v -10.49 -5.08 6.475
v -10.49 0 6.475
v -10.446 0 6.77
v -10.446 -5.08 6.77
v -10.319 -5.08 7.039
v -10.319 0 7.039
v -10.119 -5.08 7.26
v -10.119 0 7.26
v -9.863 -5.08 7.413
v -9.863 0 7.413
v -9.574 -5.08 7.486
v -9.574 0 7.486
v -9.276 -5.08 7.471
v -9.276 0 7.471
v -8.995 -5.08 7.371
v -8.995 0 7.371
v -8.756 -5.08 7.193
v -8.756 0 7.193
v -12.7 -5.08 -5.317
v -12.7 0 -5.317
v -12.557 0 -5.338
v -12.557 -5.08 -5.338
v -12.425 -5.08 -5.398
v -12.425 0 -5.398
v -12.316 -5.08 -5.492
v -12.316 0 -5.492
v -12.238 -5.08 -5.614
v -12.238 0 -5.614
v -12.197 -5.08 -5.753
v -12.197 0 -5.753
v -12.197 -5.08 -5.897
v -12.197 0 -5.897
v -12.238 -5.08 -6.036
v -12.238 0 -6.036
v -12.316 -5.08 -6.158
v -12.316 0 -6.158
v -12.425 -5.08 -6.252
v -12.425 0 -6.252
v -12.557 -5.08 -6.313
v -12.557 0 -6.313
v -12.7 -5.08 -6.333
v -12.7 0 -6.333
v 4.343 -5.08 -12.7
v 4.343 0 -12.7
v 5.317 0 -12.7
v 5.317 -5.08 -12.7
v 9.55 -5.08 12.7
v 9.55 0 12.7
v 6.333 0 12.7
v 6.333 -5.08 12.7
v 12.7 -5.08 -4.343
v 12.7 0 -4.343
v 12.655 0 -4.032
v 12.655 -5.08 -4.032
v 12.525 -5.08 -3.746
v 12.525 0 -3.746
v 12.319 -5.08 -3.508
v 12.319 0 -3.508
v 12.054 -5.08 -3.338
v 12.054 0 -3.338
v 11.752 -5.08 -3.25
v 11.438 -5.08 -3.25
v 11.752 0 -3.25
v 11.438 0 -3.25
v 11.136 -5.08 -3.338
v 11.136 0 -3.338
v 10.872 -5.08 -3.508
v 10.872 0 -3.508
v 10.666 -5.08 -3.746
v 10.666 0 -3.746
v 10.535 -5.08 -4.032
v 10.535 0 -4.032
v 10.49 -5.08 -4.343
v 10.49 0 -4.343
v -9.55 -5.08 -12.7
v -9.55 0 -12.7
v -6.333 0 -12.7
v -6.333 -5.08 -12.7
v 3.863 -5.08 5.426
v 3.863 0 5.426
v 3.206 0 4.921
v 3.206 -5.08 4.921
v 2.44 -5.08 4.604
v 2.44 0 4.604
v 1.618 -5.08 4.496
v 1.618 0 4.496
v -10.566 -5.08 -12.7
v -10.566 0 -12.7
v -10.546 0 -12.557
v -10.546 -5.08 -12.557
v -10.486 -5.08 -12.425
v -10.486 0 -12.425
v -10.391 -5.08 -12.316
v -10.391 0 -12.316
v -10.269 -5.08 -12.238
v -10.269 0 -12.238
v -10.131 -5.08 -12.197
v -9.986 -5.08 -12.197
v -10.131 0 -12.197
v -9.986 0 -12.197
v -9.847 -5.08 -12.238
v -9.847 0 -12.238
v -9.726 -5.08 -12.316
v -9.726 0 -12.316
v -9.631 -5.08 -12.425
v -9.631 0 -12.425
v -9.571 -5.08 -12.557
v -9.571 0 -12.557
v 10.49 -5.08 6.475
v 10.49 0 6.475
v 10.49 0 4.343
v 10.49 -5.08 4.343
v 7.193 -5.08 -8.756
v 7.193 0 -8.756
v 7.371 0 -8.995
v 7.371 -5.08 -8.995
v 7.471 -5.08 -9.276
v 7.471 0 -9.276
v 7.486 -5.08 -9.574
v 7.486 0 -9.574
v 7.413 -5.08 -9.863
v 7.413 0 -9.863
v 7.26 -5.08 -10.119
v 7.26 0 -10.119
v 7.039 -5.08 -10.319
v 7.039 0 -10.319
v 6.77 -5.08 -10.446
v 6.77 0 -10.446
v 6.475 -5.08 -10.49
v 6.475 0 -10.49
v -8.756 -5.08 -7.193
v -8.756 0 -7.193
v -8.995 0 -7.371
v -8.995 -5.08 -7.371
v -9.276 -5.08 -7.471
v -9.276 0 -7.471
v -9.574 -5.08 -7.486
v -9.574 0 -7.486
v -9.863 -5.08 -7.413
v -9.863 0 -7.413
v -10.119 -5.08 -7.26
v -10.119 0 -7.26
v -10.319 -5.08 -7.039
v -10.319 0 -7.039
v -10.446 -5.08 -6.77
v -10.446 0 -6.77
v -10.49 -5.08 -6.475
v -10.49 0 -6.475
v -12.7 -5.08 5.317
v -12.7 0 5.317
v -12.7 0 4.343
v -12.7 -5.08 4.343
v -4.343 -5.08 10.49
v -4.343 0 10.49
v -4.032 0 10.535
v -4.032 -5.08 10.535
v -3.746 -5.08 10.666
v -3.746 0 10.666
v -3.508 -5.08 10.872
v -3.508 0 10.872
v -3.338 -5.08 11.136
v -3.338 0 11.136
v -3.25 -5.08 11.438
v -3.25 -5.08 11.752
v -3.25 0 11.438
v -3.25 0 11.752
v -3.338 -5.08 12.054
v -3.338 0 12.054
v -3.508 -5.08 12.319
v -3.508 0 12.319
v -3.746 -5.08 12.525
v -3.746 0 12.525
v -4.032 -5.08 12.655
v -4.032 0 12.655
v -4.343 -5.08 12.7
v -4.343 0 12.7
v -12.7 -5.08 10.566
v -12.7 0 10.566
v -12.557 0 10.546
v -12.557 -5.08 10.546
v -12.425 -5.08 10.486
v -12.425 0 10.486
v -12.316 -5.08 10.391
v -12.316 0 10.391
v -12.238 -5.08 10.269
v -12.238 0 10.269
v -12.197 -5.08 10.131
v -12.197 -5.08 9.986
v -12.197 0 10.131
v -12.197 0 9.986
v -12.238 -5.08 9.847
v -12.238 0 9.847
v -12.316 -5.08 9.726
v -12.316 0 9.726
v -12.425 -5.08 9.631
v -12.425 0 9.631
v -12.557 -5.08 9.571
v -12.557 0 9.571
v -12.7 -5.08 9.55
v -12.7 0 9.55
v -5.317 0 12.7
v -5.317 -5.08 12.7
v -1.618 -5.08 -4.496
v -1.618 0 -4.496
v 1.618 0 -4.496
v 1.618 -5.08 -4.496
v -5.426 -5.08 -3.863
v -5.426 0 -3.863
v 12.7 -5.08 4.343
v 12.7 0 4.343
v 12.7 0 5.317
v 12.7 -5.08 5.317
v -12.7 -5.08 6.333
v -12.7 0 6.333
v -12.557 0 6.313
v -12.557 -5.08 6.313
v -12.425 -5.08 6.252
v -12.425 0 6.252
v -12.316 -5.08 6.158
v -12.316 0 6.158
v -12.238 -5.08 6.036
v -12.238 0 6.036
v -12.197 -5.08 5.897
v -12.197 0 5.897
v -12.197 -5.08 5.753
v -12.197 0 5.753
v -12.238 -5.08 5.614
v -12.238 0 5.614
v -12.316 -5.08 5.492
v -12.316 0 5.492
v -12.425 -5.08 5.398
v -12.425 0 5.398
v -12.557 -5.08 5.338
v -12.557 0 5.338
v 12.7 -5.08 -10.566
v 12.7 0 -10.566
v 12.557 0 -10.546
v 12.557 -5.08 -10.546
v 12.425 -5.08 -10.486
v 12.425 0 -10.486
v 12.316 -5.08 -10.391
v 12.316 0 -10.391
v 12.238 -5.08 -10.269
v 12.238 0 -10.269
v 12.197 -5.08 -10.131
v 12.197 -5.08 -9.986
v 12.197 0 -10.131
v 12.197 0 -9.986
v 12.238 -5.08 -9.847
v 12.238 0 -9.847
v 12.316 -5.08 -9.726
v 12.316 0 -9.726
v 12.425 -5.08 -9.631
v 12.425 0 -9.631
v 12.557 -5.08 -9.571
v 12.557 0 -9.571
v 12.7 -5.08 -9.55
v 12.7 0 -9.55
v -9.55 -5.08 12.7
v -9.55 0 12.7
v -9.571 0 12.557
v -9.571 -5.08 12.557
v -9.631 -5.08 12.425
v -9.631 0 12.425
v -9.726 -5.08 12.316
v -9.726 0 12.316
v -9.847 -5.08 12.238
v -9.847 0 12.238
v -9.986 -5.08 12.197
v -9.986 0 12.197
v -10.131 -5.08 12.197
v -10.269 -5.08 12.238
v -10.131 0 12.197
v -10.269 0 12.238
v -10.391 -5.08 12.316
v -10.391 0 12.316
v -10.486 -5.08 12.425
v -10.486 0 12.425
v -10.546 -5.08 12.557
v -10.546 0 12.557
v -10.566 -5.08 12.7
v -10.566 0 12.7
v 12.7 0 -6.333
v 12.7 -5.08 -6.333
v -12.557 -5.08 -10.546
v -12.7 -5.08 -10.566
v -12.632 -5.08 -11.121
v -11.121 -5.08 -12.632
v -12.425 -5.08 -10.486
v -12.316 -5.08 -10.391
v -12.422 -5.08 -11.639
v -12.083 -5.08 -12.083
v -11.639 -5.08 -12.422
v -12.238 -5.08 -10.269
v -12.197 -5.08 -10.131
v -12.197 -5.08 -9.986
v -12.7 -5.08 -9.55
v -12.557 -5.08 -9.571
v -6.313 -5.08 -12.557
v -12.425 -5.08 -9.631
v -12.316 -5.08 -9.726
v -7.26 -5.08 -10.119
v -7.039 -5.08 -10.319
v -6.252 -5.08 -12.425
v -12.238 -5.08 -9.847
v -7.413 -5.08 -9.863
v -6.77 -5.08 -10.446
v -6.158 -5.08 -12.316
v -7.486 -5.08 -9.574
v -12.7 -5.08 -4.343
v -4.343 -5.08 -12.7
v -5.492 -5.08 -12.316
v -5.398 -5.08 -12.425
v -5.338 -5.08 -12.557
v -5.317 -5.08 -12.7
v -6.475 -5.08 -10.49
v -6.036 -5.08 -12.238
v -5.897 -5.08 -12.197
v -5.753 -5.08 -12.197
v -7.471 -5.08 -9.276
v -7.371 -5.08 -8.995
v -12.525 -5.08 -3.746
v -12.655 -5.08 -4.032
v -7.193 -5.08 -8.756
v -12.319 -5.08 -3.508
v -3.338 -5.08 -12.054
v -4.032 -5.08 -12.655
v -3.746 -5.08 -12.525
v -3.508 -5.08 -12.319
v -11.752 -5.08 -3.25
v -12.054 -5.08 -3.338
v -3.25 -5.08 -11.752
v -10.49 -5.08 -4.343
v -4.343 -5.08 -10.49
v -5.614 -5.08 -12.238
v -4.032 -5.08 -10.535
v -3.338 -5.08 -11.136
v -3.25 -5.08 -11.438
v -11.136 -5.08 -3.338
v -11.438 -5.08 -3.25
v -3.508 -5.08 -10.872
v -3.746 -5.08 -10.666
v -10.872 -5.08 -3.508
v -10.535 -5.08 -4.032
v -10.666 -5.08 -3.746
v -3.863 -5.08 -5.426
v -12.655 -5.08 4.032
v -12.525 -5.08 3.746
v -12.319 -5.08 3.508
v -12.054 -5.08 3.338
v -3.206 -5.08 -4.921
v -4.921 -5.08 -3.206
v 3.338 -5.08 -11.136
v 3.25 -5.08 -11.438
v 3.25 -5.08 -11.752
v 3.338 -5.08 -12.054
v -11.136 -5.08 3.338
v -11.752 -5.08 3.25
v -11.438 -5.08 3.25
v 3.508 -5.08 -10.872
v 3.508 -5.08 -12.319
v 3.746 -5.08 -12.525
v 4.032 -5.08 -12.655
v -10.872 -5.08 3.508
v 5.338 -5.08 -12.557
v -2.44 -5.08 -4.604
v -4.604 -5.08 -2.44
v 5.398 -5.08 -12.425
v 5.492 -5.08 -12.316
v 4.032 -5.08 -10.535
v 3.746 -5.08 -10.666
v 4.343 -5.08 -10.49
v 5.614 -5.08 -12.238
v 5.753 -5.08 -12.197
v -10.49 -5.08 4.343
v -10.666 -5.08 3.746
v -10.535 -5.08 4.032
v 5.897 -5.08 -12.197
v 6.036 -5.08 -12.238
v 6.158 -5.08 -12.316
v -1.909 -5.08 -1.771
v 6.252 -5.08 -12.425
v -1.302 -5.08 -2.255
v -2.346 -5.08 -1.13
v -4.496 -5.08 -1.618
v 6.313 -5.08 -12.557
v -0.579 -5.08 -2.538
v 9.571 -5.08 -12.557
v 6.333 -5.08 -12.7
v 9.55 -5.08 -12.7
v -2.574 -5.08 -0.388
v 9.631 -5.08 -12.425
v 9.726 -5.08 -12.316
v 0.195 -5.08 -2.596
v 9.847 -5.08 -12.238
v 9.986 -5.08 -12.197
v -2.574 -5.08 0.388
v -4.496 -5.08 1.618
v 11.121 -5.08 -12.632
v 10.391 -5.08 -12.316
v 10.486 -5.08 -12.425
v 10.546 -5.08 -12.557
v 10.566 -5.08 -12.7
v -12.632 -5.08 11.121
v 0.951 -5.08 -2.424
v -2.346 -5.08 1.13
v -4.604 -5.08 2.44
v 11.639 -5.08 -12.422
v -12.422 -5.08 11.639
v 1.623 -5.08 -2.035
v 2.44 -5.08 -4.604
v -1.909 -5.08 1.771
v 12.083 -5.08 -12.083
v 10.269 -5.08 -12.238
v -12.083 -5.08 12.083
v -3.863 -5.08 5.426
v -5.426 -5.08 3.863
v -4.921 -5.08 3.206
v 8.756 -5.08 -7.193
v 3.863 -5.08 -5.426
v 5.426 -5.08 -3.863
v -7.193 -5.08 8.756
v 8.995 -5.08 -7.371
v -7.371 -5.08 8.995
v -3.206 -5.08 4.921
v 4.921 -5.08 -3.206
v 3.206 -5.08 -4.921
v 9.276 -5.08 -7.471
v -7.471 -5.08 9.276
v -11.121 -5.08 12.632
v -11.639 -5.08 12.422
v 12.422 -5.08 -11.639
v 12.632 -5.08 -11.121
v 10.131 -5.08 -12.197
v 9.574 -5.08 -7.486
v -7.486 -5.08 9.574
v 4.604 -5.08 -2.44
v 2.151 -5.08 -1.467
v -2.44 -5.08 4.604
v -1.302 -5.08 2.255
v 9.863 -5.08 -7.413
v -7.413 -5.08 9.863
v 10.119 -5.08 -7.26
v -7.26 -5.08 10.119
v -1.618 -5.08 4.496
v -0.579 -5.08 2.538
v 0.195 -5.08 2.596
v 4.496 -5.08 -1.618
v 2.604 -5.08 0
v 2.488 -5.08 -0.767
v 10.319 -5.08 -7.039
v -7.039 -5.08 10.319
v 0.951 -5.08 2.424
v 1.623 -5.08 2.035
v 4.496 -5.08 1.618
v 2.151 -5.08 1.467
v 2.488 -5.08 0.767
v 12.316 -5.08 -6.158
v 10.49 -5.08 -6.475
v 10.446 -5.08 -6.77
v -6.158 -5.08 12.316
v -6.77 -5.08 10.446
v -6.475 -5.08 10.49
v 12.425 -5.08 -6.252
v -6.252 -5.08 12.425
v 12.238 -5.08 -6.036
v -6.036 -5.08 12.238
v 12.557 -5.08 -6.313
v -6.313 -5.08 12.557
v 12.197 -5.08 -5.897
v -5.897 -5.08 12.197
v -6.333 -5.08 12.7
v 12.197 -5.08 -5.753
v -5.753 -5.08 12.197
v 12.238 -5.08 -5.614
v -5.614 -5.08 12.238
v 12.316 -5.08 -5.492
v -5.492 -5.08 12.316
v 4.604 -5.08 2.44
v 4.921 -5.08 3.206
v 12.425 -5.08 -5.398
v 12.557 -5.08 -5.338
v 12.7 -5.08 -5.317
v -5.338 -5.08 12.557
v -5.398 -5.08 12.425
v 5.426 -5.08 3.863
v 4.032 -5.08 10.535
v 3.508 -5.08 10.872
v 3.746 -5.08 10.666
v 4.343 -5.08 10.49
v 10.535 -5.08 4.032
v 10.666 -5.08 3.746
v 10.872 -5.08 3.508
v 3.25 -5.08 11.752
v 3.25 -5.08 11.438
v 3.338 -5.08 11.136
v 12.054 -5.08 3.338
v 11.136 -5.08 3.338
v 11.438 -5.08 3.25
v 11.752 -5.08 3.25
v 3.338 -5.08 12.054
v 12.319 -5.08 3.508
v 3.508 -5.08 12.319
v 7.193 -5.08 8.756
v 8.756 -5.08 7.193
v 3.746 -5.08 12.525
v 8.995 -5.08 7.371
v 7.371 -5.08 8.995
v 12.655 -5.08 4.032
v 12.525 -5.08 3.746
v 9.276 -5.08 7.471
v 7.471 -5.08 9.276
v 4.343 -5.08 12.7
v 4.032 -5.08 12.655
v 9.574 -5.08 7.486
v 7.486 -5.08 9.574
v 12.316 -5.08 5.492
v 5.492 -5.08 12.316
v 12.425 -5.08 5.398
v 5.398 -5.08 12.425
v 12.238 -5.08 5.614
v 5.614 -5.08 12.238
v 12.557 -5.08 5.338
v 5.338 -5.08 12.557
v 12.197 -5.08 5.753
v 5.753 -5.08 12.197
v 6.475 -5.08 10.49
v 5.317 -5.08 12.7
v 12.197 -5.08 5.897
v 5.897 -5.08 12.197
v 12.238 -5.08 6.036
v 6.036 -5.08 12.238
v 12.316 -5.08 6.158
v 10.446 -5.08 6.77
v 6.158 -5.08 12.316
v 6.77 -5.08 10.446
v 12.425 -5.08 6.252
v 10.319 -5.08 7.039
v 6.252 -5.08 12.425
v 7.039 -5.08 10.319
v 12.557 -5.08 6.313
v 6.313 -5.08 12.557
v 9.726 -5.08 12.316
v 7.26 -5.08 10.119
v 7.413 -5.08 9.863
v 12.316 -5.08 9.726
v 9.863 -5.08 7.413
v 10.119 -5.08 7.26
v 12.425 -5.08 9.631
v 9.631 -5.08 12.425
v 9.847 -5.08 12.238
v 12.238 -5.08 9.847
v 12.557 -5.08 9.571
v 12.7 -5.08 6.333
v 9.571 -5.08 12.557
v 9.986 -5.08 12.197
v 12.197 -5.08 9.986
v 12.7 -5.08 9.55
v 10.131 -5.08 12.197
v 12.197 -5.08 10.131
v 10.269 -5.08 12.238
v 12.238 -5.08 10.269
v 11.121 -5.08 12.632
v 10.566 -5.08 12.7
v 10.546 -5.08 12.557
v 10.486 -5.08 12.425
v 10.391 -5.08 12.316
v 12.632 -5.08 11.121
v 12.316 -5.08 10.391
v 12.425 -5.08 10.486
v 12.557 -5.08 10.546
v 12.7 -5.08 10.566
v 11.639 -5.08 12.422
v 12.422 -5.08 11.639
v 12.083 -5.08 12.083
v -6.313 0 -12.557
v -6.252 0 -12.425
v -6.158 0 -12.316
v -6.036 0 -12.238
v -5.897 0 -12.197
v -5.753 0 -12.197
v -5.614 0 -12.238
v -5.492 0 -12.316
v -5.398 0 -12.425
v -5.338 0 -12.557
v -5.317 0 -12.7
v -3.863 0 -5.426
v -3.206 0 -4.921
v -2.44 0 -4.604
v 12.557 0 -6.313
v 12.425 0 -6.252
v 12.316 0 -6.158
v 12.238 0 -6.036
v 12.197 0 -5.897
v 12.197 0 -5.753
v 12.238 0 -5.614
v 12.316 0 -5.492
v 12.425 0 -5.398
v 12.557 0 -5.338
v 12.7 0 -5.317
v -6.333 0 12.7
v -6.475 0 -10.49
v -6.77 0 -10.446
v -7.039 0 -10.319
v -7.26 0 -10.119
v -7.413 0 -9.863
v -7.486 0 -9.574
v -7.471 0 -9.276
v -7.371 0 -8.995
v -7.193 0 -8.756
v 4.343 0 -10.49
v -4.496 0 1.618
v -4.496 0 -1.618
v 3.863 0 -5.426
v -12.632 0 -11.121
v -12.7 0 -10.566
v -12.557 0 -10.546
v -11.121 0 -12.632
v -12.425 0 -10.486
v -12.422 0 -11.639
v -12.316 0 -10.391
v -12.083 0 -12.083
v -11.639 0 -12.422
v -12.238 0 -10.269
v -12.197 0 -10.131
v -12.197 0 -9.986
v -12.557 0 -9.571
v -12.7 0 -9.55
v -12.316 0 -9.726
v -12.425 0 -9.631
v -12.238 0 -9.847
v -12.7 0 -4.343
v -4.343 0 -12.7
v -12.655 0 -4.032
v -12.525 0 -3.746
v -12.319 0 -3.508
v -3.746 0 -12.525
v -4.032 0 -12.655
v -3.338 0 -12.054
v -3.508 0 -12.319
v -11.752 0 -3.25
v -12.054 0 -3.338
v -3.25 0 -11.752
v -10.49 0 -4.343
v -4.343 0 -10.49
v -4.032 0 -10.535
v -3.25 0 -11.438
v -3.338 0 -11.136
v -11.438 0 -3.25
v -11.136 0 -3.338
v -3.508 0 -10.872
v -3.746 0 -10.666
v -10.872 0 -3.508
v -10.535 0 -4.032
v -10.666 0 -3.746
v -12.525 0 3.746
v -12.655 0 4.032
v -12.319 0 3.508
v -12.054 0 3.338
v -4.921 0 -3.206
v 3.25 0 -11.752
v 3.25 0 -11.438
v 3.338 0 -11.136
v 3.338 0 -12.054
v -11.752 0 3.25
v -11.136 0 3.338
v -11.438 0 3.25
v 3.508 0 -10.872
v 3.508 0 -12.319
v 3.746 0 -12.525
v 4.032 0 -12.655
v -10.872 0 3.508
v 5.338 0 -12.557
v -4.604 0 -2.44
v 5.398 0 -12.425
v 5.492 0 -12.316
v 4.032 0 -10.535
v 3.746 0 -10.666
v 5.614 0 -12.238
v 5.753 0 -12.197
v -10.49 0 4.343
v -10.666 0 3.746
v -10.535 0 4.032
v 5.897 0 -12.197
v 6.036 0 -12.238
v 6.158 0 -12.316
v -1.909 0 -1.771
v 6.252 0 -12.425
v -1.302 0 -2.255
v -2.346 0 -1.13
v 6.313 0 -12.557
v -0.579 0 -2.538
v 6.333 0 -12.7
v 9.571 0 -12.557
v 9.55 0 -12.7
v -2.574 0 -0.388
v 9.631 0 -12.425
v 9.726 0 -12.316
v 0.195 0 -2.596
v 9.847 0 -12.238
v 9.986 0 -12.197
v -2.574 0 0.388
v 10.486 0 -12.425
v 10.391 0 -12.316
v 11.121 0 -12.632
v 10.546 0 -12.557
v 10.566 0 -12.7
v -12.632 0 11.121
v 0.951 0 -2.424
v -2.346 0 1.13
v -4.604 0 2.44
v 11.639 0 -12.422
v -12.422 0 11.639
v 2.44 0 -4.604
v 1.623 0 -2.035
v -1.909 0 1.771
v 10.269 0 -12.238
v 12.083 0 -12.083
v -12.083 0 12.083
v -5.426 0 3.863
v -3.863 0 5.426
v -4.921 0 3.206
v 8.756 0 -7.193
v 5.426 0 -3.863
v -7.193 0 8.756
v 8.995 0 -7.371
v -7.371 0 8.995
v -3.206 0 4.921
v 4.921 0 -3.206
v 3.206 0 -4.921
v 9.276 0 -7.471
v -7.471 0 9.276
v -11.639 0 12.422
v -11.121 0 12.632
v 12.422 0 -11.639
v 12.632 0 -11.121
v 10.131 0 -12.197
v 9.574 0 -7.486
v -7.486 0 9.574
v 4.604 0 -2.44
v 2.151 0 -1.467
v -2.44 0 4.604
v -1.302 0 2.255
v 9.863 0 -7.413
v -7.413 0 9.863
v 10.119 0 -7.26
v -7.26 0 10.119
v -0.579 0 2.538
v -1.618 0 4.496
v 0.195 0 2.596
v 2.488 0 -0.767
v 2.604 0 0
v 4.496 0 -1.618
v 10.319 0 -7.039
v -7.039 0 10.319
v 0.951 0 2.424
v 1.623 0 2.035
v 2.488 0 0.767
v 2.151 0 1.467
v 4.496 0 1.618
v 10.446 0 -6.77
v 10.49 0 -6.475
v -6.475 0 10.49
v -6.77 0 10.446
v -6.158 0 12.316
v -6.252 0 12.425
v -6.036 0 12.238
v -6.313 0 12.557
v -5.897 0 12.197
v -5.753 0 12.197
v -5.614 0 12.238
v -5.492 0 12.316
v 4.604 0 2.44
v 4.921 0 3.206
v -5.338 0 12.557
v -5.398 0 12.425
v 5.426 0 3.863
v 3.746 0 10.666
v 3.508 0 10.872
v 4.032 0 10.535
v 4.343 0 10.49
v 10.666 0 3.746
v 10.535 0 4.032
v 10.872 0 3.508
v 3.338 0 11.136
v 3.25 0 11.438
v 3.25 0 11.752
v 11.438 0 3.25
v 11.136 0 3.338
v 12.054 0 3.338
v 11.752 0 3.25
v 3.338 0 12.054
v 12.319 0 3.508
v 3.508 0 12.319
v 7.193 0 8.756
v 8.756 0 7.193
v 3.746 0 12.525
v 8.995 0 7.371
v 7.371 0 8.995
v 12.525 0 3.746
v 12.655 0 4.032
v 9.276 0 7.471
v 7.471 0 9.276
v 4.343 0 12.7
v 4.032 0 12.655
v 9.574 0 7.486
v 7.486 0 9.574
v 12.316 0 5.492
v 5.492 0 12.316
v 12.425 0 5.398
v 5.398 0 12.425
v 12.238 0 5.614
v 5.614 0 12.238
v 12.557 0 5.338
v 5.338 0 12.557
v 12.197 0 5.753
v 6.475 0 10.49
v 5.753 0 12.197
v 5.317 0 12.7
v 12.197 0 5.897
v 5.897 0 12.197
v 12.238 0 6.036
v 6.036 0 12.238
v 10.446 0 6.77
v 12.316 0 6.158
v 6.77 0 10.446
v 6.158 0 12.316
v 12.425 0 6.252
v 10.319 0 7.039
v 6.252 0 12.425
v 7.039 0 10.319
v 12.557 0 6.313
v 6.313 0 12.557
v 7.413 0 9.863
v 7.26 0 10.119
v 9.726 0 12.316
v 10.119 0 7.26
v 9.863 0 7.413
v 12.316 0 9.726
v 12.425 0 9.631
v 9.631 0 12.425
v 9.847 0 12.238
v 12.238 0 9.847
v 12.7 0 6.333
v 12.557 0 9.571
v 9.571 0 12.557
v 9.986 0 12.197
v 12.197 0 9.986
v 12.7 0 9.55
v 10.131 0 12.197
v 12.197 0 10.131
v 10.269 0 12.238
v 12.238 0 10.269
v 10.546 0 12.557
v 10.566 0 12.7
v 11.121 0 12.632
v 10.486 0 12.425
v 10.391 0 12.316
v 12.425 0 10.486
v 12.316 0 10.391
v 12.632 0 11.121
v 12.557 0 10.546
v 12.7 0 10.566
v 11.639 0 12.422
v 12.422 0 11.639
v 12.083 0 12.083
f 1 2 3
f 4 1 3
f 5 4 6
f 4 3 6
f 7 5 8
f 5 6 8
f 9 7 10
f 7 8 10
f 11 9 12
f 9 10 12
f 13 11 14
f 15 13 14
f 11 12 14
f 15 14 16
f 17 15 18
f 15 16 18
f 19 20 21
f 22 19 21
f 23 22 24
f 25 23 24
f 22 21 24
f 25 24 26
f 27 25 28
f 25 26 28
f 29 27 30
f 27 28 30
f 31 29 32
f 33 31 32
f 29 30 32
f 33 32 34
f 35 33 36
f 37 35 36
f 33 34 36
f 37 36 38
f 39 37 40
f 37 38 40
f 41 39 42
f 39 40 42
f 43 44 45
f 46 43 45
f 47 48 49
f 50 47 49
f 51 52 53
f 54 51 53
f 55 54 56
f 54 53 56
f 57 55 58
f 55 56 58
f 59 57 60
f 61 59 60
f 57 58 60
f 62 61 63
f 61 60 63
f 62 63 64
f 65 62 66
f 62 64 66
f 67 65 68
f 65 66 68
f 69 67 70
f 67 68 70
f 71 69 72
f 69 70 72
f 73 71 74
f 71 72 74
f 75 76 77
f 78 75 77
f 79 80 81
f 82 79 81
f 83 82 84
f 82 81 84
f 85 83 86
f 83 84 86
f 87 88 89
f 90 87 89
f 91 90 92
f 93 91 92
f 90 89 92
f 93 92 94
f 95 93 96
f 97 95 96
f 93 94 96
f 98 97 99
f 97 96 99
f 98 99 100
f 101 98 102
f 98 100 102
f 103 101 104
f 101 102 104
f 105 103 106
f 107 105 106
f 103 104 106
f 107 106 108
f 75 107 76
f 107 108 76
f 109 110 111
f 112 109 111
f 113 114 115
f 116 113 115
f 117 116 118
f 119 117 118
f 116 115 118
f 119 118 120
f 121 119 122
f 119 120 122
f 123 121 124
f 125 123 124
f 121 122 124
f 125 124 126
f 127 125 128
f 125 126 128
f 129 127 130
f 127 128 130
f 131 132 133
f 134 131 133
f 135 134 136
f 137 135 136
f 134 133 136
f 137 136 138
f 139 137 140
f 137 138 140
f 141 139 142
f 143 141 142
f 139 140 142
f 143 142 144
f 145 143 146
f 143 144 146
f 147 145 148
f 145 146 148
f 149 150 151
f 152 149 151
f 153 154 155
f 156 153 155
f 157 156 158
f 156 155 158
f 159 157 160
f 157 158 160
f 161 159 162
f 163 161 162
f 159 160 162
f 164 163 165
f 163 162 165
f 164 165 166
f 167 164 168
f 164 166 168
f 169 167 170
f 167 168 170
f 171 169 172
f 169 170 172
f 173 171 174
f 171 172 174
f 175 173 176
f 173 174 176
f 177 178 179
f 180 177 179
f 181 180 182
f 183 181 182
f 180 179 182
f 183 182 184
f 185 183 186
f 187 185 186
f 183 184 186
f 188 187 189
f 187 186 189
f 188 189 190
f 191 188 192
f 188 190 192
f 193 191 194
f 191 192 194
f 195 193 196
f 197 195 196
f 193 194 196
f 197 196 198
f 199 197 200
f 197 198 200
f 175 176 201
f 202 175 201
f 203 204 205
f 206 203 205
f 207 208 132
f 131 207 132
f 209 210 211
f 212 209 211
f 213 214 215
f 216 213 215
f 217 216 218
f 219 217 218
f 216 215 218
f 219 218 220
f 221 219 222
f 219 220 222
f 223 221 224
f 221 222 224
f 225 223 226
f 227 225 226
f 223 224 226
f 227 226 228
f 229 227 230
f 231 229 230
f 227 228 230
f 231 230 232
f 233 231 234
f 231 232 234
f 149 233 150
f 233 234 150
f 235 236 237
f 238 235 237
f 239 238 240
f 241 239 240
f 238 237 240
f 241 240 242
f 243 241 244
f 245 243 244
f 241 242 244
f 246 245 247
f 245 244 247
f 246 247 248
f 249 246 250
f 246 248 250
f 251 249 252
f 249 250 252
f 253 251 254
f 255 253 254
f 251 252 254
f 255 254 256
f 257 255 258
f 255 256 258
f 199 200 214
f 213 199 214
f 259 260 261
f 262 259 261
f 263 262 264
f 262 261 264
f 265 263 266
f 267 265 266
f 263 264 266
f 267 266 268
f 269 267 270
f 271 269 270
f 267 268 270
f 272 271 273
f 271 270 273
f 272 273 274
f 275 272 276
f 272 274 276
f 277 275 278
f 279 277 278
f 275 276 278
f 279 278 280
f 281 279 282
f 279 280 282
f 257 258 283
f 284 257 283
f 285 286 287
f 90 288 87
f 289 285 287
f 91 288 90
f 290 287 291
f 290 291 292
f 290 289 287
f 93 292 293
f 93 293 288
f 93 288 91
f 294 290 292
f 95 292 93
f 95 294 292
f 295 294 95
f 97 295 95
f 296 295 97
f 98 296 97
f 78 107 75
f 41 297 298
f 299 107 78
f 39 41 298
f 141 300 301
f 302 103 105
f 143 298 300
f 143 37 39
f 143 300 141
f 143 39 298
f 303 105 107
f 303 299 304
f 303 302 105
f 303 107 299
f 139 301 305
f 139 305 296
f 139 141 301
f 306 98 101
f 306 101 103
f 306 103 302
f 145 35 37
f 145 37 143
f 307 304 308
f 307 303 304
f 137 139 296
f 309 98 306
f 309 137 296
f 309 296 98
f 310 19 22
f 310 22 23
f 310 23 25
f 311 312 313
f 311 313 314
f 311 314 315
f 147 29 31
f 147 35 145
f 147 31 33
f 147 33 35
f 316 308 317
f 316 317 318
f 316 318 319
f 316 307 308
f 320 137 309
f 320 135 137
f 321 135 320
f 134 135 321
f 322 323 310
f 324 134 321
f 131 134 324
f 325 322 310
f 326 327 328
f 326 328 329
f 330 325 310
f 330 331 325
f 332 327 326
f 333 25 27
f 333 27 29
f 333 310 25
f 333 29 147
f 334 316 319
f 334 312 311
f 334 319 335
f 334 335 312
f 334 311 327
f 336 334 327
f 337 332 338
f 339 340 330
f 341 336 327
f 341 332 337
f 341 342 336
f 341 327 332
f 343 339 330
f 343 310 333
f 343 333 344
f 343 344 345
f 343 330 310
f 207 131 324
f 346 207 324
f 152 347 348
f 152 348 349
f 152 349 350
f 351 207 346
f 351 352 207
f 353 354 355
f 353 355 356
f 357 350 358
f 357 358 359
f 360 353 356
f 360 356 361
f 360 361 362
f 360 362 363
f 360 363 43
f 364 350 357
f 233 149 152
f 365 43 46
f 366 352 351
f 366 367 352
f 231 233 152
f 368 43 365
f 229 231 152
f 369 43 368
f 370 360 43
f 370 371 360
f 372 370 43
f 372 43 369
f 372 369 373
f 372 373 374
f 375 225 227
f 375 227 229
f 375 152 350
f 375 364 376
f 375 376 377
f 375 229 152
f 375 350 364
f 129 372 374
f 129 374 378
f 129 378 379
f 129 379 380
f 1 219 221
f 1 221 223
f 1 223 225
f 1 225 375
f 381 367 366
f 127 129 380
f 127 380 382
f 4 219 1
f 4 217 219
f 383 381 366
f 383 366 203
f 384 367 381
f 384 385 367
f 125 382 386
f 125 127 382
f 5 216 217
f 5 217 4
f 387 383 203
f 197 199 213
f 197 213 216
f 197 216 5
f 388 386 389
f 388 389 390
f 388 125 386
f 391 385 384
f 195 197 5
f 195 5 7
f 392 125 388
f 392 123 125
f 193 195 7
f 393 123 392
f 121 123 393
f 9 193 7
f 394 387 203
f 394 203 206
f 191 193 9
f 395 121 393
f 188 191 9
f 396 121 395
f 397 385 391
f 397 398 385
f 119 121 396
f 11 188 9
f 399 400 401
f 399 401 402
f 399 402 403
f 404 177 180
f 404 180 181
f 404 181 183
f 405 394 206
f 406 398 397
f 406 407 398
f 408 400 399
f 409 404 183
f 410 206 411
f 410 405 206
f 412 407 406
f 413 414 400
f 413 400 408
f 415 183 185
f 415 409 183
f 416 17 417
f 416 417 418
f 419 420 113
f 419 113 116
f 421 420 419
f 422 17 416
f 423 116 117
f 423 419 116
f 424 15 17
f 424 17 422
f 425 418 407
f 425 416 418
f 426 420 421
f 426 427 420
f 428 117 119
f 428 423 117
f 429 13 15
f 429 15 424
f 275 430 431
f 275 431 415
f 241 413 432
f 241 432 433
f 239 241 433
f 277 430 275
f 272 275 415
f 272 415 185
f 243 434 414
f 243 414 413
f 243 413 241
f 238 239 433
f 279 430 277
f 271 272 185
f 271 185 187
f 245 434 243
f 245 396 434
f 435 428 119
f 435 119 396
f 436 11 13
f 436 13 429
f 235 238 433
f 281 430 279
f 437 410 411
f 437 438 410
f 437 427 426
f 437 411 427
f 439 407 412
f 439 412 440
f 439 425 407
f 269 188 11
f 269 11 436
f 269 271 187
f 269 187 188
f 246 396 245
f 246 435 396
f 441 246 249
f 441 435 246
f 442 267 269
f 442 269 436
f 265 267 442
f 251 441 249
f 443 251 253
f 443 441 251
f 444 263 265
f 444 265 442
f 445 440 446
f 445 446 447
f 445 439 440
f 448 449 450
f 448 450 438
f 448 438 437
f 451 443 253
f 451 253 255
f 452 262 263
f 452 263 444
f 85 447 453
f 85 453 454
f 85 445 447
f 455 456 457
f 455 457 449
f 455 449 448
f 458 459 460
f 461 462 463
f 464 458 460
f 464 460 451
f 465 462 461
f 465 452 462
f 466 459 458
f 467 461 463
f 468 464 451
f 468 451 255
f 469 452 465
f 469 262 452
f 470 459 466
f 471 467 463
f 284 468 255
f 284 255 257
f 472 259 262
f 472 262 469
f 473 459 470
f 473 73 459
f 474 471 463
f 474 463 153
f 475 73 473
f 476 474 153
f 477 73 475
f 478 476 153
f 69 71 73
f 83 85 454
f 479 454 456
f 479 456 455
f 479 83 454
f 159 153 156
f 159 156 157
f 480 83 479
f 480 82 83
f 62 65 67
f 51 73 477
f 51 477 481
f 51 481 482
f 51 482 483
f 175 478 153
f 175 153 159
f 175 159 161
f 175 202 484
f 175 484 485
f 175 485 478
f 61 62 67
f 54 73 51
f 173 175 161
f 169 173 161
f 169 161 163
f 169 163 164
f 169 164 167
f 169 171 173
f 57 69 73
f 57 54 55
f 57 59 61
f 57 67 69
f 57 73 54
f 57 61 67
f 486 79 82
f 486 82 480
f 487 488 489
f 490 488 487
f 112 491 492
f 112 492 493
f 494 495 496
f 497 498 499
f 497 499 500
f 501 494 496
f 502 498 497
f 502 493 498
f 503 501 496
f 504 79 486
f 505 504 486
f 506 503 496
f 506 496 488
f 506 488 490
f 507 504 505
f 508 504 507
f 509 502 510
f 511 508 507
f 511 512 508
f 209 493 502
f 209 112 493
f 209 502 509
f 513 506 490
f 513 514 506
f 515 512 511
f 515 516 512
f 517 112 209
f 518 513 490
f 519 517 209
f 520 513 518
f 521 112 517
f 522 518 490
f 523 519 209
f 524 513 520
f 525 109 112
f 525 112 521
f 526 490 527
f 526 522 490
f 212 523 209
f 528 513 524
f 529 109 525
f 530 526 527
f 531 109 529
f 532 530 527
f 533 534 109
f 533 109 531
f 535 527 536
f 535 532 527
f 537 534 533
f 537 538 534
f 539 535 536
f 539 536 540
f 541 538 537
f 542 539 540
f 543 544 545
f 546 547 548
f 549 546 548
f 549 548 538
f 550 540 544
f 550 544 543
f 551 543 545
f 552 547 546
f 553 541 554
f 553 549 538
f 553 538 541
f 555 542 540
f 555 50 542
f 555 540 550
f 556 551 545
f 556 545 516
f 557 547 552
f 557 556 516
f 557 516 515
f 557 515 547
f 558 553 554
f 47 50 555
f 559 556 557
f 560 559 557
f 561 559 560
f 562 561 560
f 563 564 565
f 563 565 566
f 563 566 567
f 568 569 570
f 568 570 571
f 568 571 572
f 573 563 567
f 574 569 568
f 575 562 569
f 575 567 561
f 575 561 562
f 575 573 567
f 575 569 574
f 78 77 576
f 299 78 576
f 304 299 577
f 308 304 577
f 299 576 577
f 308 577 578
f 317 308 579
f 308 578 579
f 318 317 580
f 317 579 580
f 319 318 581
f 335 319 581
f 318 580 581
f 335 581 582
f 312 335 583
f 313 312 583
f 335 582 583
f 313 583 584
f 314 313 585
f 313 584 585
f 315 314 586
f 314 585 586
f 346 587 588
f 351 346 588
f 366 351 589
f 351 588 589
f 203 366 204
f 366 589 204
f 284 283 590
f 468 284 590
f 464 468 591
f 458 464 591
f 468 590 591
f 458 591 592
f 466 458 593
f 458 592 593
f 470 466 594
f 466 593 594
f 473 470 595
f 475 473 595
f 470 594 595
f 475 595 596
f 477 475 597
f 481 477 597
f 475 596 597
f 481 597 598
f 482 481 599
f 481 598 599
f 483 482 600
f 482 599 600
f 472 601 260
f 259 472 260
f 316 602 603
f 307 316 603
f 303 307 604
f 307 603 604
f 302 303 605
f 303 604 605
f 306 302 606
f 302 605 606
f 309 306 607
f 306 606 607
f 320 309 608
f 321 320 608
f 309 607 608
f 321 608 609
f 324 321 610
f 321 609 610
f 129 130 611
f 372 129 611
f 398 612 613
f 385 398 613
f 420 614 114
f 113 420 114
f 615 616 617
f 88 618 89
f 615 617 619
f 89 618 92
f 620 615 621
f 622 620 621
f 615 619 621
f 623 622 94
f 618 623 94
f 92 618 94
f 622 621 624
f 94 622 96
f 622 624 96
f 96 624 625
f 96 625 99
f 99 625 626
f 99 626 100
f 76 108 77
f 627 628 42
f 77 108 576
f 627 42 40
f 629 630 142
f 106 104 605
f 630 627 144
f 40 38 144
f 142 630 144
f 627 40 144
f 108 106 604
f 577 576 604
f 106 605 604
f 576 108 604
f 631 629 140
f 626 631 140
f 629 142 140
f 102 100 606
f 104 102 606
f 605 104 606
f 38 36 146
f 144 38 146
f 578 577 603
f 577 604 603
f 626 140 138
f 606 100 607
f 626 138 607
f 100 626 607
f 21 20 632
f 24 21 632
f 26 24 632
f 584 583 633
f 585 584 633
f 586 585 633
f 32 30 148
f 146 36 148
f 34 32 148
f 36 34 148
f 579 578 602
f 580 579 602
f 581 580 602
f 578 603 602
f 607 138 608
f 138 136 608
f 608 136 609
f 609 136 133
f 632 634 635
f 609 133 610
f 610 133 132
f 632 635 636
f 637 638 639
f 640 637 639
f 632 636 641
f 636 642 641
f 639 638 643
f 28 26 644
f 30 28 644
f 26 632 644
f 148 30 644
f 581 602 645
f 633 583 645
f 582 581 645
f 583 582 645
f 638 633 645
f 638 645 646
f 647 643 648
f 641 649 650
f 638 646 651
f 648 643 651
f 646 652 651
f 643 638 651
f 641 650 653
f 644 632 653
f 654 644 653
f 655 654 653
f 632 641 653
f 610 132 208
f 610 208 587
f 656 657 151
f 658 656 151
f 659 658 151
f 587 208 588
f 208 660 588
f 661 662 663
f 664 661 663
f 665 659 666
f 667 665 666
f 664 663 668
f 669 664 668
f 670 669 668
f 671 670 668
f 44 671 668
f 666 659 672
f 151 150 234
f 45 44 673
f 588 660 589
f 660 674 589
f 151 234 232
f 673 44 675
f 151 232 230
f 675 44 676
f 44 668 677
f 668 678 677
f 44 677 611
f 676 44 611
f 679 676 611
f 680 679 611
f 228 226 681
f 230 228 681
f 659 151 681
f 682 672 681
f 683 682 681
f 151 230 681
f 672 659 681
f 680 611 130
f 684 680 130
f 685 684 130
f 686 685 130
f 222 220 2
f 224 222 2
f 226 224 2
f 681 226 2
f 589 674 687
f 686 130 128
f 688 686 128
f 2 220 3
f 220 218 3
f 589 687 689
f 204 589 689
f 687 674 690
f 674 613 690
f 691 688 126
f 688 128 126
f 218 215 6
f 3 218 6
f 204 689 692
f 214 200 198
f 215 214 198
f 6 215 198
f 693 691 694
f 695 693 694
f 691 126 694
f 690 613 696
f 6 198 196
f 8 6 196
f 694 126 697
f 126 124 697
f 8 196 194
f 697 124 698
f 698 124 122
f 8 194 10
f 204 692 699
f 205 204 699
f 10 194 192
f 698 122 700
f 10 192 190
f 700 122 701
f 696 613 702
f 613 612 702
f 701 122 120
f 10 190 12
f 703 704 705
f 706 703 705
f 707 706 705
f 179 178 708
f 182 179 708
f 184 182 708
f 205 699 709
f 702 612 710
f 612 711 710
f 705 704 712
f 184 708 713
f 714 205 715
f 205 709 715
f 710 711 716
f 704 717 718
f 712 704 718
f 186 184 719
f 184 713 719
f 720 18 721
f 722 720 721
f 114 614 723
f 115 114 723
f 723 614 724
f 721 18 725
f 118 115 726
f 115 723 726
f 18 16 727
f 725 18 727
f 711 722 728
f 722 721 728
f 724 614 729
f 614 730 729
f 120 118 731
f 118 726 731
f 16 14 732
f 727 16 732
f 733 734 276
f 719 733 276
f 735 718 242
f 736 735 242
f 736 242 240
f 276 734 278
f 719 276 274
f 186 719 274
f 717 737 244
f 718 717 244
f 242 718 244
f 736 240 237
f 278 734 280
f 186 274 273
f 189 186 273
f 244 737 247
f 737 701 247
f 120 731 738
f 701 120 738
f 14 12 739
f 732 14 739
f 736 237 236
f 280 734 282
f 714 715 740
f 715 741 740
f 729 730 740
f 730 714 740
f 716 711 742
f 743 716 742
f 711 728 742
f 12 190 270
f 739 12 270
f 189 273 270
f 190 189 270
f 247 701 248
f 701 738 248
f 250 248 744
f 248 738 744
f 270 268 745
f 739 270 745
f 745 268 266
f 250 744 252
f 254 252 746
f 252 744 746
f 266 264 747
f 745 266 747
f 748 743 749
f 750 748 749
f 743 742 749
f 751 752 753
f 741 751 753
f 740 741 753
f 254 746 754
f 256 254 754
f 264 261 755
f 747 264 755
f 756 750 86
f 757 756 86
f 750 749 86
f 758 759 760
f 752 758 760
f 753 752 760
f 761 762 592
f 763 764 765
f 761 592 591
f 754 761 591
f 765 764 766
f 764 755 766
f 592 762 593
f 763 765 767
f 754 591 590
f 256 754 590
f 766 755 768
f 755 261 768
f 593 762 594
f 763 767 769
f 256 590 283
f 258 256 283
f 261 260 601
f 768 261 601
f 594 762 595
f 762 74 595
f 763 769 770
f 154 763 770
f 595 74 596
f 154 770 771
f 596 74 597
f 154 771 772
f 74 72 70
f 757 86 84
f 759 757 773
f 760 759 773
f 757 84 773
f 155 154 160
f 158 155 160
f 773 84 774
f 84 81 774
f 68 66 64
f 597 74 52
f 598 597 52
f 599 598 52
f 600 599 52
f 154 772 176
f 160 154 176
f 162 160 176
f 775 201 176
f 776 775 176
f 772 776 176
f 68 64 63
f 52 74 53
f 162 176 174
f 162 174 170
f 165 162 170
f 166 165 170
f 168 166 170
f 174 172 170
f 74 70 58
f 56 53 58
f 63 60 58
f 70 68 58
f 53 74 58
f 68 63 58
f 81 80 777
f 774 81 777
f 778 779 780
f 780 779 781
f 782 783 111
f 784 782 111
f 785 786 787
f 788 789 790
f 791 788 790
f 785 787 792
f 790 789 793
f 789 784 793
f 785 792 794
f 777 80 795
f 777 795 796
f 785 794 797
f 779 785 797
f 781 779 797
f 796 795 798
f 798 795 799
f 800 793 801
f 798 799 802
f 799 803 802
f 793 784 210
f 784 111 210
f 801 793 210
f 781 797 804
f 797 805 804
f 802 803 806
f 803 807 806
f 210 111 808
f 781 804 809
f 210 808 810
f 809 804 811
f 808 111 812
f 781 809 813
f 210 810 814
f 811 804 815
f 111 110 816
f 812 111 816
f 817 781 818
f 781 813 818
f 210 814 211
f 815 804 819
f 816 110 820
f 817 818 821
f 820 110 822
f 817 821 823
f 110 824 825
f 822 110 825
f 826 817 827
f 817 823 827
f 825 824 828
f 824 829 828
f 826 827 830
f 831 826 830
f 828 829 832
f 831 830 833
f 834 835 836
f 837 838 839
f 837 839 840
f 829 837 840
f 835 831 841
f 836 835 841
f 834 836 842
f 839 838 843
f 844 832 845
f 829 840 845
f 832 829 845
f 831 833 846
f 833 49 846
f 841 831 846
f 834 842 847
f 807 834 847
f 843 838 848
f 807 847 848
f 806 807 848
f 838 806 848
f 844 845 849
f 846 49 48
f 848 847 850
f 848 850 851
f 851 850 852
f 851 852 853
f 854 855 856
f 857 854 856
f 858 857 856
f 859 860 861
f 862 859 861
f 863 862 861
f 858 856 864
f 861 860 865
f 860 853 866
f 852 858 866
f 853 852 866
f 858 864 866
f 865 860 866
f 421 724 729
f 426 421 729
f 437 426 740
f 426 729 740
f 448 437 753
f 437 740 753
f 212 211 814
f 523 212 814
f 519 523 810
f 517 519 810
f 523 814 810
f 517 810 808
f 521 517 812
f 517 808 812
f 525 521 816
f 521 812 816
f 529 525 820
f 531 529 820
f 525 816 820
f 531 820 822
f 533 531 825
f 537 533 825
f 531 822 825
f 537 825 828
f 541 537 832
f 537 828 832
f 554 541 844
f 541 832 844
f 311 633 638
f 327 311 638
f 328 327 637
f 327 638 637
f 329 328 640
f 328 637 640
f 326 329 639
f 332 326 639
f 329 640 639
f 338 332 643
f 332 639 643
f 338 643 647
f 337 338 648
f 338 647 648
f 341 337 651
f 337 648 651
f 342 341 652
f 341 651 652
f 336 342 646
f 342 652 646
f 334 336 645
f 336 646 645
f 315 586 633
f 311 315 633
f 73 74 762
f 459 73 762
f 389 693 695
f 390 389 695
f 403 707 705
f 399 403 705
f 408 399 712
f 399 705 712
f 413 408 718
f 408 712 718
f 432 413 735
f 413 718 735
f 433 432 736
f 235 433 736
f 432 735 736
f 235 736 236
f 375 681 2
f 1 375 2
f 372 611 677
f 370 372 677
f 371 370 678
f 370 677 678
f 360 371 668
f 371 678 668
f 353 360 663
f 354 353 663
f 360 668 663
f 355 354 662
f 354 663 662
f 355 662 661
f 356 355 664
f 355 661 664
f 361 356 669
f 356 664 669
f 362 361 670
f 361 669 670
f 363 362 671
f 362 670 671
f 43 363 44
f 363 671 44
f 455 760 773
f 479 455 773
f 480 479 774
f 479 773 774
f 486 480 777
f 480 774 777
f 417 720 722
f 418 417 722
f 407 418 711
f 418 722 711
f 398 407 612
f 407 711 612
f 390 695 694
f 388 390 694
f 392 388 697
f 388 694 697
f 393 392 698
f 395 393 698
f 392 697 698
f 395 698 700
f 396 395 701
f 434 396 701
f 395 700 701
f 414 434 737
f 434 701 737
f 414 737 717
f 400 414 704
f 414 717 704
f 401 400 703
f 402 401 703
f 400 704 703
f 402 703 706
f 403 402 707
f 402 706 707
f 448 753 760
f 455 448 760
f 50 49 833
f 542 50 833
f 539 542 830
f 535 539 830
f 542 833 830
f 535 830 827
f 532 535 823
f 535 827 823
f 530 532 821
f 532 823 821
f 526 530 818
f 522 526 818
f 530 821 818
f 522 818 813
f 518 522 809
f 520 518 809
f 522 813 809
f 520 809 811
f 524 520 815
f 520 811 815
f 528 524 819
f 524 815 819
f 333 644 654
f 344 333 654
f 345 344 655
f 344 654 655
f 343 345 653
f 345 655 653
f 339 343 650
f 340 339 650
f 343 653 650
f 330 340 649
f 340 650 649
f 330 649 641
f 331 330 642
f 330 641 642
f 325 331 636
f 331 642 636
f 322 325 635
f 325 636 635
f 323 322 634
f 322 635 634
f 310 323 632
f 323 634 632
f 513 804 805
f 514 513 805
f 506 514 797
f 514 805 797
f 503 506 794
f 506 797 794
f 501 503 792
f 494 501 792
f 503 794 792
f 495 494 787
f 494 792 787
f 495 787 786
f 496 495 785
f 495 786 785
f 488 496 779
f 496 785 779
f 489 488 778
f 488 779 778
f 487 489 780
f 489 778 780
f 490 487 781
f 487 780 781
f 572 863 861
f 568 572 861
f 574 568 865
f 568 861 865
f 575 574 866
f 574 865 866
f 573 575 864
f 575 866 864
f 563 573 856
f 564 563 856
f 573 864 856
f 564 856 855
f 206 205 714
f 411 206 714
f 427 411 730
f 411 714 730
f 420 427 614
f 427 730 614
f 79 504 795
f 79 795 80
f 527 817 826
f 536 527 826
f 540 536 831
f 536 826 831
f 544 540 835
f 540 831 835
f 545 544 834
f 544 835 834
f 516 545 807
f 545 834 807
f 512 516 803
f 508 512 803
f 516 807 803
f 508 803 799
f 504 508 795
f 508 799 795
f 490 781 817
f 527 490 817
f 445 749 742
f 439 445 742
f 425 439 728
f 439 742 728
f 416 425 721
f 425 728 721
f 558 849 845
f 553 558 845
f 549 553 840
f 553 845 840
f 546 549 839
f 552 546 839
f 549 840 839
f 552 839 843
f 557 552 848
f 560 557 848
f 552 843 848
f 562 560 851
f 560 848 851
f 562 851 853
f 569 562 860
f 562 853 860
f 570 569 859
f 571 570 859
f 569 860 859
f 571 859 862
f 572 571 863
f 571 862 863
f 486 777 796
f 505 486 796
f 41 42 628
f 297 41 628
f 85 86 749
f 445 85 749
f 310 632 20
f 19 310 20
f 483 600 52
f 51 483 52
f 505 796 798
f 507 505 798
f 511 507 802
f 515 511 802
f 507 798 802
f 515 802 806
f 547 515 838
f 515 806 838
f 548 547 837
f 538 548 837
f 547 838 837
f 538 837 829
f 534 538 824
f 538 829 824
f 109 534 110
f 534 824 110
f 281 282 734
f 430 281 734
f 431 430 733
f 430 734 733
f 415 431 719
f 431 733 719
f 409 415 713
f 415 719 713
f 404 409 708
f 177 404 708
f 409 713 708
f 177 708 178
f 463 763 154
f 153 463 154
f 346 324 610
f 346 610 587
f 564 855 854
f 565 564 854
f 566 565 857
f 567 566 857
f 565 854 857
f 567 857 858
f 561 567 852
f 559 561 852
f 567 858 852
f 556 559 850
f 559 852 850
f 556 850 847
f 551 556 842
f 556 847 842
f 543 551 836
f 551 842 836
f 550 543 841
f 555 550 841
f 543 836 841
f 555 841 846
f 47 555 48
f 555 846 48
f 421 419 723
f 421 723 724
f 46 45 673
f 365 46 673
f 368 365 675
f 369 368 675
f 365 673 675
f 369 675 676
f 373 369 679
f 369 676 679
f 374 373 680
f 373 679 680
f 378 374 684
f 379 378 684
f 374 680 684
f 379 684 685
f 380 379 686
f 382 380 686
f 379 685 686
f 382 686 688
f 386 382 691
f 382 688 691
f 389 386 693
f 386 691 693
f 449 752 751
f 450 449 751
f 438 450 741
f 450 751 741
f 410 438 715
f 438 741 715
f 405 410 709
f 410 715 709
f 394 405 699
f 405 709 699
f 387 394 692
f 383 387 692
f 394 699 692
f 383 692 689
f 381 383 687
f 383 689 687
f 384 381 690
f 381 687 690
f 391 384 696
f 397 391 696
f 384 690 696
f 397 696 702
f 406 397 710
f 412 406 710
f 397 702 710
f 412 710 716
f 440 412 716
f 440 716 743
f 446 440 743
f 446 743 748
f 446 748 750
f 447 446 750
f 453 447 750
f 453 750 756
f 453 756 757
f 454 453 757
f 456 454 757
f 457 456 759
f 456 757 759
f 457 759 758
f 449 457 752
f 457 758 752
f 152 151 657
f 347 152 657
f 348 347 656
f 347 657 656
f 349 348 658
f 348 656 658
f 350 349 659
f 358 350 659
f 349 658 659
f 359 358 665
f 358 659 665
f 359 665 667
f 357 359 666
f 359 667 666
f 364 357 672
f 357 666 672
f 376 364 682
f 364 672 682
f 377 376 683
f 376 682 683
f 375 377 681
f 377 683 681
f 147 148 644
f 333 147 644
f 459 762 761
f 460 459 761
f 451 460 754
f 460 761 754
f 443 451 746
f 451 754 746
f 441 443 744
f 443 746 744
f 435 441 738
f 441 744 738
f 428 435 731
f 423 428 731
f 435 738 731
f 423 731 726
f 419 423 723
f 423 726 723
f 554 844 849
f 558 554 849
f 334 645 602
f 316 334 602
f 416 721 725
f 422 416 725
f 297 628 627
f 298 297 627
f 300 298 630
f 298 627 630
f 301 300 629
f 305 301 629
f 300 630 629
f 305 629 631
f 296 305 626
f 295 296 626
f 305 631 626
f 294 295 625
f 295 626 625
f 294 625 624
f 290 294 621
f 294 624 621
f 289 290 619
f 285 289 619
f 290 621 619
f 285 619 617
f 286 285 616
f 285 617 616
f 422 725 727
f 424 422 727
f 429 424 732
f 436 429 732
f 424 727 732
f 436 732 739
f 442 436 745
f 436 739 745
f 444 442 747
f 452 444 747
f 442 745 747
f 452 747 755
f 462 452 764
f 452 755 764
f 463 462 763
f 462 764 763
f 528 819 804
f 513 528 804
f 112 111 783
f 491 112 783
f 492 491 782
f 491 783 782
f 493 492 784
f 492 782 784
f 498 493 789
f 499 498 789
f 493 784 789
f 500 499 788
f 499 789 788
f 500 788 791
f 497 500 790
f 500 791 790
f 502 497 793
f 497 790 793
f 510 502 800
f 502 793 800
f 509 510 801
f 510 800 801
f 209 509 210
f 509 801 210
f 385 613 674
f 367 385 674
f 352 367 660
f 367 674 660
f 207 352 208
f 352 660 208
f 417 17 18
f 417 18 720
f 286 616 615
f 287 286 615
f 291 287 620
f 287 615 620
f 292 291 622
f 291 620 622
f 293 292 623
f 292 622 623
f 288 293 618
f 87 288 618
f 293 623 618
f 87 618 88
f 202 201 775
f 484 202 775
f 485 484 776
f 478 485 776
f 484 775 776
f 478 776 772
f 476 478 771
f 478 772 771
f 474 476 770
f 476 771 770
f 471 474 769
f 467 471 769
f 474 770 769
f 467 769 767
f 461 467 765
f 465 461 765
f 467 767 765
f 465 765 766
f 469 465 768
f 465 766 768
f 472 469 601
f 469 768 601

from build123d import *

# Parameters (mm, degrees)
F1_DEPTH = 5.08


# Not quite as in the source:
# - ends of sketch curves that miss each other by under 0.0002 mm in the source are joined


with BuildPart() as f1:
    # F0 (on Front) → F1 (new body)
    with BuildSketch(Plane.XZ):
        with BuildLine():
            ThreePointArc((-12.7, -9.5504), (-12.1920000057, -10.0583238), (-12.6998476, -10.5663999771))
            ThreePointArc((-12.6998476, -10.5663999771), (-12.0825225161, -12.0825225161), (-10.5664000074, -12.6998469825))
            ThreePointArc((-10.5664000074, -12.6998469825), (-10.0583238, -12.1920000057), (-9.5504, -12.7))
            Line((-9.5504, -12.7), (-6.3330836, -12.7))
            ThreePointArc((-6.3330836, -12.7), (-5.8250836, -12.192), (-5.3170836, -12.7))
            Line((-5.3170836, -12.7), (-4.3434, -12.7))
            ThreePointArc((-4.3434, -12.7), (-3.2385, -11.5951), (-4.3434, -10.4902))
            Line((-4.3434, -10.4902), (-6.4747902, -10.4902))
            ThreePointArc((-6.4747902, -10.4902), (-7.413451805, -9.8630063673), (-7.1932106897, -8.7557795103))
            Line((-7.1932106897, -8.7557795103), (-3.8631622, -5.4257448))
            ThreePointArc((-3.8631622, -5.4257448), (-2.8331268978, -4.7374824843), (-1.618107, -4.4958))
            Line((-1.618107, -4.4958), (1.618107, -4.4958))
            ThreePointArc((1.618107, -4.4958), (2.8331268978, -4.7374824843), (3.8631710303, -5.4257359697))
            Line((3.8631710303, -5.4257359697), (7.1932038, -8.7557864))
            ThreePointArc((7.1932038, -8.7557864), (7.413451805, -9.8630063673), (6.4747902, -10.4902))
            Line((6.4747902, -10.4902), (4.3434, -10.4902))
            ThreePointArc((4.3434, -10.4902), (3.2385, -11.5951), (4.3434, -12.7))
            Line((4.3434, -12.7), (5.3170836, -12.7))
            ThreePointArc((5.3170836, -12.7), (5.8250836, -12.192), (6.3330836, -12.7))
            Line((6.3330836, -12.7), (9.5504, -12.7))
            ThreePointArc((9.5504, -12.7), (10.0583238, -12.1920000057), (10.5663999771, -12.6998476))
            ThreePointArc((10.5663999771, -12.6998476), (12.0825225161, -12.0825225161), (12.6998469825, -10.5664000074))
            ThreePointArc((12.6998469825, -10.5664000074), (12.1920000057, -10.0583238), (12.7, -9.5504))
            Line((12.7, -9.5504), (12.7, -6.3330836))
            ThreePointArc((12.7, -6.3330836), (12.192, -5.8250836), (12.7, -5.3170836))
            Line((12.7, -5.3170836), (12.7, -4.3434))
            ThreePointArc((12.7, -4.3434), (11.5951, -3.2385), (10.4902, -4.3434))
            Line((10.4902, -4.3434), (10.4902, -6.4747902))
            ThreePointArc((10.4902, -6.4747902), (9.8630063673, -7.413451805), (8.7557795103, -7.1932106897))
            Line((8.7557795103, -7.1932106897), (5.4257448, -3.8631622))
            ThreePointArc((5.4257448, -3.8631622), (4.7374824843, -2.8331268978), (4.4958, -1.618107))
            Line((4.4958, -1.618107), (4.4958, 1.618107))
            ThreePointArc((4.4958, 1.618107), (4.7374824843, 2.8331268978), (5.4257359697, 3.8631710303))
            Line((5.4257359697, 3.8631710303), (8.7557864, 7.1932038))
            ThreePointArc((8.7557864, 7.1932038), (9.8630063673, 7.413451805), (10.4902, 6.4747902))
            Line((10.4902, 6.4747902), (10.4902, 4.3434))
            ThreePointArc((10.4902, 4.3434), (11.5951, 3.2385), (12.7, 4.3434))
            Line((12.7, 4.3434), (12.7, 5.3170836))
            ThreePointArc((12.7, 5.3170836), (12.192, 5.8250836), (12.7, 6.3330836))
            Line((12.7, 6.3330836), (12.7, 9.5504))
            ThreePointArc((12.7, 9.5504), (12.1920000057, 10.0583238), (12.6998476, 10.5663999771))
            ThreePointArc((12.6998476, 10.5663999771), (12.0825225161, 12.0825225161), (10.5664000074, 12.6998469825))
            ThreePointArc((10.5664000074, 12.6998469825), (10.0583238, 12.1920000057), (9.5504, 12.7))
            Line((9.5504, 12.7), (6.3330836, 12.7))
            ThreePointArc((6.3330836, 12.7), (5.8250836, 12.192), (5.3170836, 12.7))
            Line((5.3170836, 12.7), (4.3434, 12.7))
            ThreePointArc((4.3434, 12.7), (3.2385, 11.5951), (4.3434, 10.4902))
            Line((4.3434, 10.4902), (6.4747902, 10.4902))
            ThreePointArc((6.4747902, 10.4902), (7.413451805, 9.8630063673), (7.1932106897, 8.7557795103))
            Line((7.1932106897, 8.7557795103), (3.8631622, 5.4257448))
            ThreePointArc((3.8631622, 5.4257448), (2.8331268978, 4.7374824843), (1.618107, 4.4958))
            Line((1.618107, 4.4958), (-1.618107, 4.4958))
            ThreePointArc((-1.618107, 4.4958), (-2.8331268978, 4.7374824843), (-3.8631710303, 5.4257359697))
            Line((-3.8631710303, 5.4257359697), (-7.1932038, 8.7557864))
            ThreePointArc((-7.1932038, 8.7557864), (-7.413451805, 9.8630063673), (-6.4747902, 10.4902))
            Line((-6.4747902, 10.4902), (-4.3434, 10.4902))
            ThreePointArc((-4.3434, 10.4902), (-3.2385, 11.5951), (-4.3434, 12.7))
            Line((-4.3434, 12.7), (-5.3170836, 12.7))
            ThreePointArc((-5.3170836, 12.7), (-5.8250836, 12.192), (-6.3330836, 12.7))
            Line((-6.3330836, 12.7), (-9.5504, 12.7))
            ThreePointArc((-9.5504, 12.7), (-10.0583238, 12.1920000057), (-10.5663999771, 12.6998476))
            ThreePointArc((-10.5663999771, 12.6998476), (-12.0825225161, 12.0825225161), (-12.6998469825, 10.5664000074))
            ThreePointArc((-12.6998469825, 10.5664000074), (-12.1920000057, 10.0583238), (-12.7, 9.5504))
            Line((-12.7, 9.5504), (-12.7, 6.3330836))
            ThreePointArc((-12.7, 6.3330836), (-12.192, 5.8250836), (-12.7, 5.3170836))
            Line((-12.7, 5.3170836), (-12.7, 4.3434))
            ThreePointArc((-12.7, 4.3434), (-11.5951, 3.2385), (-10.4902, 4.3434))
            Line((-10.4902, 4.3434), (-10.4902, 6.4747902))
            ThreePointArc((-10.4902, 6.4747902), (-9.8630063673, 7.413451805), (-8.7557795103, 7.1932106897))
            Line((-8.7557795103, 7.1932106897), (-5.4257448, 3.8631622))
            ThreePointArc((-5.4257448, 3.8631622), (-4.7374824843, 2.8331268978), (-4.4958, 1.618107))
            Line((-4.4958, 1.618107), (-4.4958, -1.618107))
            ThreePointArc((-4.4958, -1.618107), (-4.7374824843, -2.8331268978), (-5.4257359697, -3.8631710303))
            Line((-5.4257359697, -3.8631710303), (-8.7557864, -7.1932038))
            ThreePointArc((-8.7557864, -7.1932038), (-9.8630063673, -7.413451805), (-10.4902, -6.4747902))
            Line((-10.4902, -6.4747902), (-10.4902, -4.3434))
            ThreePointArc((-10.4902, -4.3434), (-11.5951, -3.2385), (-12.7, -4.3434))
            Line((-12.7, -4.3434), (-12.7, -5.3170836))
            ThreePointArc((-12.7, -5.3170836), (-12.192, -5.8250836), (-12.7, -6.3330836))
            Line((-12.7, -6.3330836), (-12.7, -9.5504))
        make_face()
        with BuildLine():
            ThreePointArc((-2.6035, 0), (0, 2.6035), (2.6035, 0))
            ThreePointArc((2.6035, 0), (0, -2.6035), (-2.6035, 0))
        make_face(mode=Mode.SUBTRACT)
    extrude(amount=F1_DEPTH)


solid = f1.part
